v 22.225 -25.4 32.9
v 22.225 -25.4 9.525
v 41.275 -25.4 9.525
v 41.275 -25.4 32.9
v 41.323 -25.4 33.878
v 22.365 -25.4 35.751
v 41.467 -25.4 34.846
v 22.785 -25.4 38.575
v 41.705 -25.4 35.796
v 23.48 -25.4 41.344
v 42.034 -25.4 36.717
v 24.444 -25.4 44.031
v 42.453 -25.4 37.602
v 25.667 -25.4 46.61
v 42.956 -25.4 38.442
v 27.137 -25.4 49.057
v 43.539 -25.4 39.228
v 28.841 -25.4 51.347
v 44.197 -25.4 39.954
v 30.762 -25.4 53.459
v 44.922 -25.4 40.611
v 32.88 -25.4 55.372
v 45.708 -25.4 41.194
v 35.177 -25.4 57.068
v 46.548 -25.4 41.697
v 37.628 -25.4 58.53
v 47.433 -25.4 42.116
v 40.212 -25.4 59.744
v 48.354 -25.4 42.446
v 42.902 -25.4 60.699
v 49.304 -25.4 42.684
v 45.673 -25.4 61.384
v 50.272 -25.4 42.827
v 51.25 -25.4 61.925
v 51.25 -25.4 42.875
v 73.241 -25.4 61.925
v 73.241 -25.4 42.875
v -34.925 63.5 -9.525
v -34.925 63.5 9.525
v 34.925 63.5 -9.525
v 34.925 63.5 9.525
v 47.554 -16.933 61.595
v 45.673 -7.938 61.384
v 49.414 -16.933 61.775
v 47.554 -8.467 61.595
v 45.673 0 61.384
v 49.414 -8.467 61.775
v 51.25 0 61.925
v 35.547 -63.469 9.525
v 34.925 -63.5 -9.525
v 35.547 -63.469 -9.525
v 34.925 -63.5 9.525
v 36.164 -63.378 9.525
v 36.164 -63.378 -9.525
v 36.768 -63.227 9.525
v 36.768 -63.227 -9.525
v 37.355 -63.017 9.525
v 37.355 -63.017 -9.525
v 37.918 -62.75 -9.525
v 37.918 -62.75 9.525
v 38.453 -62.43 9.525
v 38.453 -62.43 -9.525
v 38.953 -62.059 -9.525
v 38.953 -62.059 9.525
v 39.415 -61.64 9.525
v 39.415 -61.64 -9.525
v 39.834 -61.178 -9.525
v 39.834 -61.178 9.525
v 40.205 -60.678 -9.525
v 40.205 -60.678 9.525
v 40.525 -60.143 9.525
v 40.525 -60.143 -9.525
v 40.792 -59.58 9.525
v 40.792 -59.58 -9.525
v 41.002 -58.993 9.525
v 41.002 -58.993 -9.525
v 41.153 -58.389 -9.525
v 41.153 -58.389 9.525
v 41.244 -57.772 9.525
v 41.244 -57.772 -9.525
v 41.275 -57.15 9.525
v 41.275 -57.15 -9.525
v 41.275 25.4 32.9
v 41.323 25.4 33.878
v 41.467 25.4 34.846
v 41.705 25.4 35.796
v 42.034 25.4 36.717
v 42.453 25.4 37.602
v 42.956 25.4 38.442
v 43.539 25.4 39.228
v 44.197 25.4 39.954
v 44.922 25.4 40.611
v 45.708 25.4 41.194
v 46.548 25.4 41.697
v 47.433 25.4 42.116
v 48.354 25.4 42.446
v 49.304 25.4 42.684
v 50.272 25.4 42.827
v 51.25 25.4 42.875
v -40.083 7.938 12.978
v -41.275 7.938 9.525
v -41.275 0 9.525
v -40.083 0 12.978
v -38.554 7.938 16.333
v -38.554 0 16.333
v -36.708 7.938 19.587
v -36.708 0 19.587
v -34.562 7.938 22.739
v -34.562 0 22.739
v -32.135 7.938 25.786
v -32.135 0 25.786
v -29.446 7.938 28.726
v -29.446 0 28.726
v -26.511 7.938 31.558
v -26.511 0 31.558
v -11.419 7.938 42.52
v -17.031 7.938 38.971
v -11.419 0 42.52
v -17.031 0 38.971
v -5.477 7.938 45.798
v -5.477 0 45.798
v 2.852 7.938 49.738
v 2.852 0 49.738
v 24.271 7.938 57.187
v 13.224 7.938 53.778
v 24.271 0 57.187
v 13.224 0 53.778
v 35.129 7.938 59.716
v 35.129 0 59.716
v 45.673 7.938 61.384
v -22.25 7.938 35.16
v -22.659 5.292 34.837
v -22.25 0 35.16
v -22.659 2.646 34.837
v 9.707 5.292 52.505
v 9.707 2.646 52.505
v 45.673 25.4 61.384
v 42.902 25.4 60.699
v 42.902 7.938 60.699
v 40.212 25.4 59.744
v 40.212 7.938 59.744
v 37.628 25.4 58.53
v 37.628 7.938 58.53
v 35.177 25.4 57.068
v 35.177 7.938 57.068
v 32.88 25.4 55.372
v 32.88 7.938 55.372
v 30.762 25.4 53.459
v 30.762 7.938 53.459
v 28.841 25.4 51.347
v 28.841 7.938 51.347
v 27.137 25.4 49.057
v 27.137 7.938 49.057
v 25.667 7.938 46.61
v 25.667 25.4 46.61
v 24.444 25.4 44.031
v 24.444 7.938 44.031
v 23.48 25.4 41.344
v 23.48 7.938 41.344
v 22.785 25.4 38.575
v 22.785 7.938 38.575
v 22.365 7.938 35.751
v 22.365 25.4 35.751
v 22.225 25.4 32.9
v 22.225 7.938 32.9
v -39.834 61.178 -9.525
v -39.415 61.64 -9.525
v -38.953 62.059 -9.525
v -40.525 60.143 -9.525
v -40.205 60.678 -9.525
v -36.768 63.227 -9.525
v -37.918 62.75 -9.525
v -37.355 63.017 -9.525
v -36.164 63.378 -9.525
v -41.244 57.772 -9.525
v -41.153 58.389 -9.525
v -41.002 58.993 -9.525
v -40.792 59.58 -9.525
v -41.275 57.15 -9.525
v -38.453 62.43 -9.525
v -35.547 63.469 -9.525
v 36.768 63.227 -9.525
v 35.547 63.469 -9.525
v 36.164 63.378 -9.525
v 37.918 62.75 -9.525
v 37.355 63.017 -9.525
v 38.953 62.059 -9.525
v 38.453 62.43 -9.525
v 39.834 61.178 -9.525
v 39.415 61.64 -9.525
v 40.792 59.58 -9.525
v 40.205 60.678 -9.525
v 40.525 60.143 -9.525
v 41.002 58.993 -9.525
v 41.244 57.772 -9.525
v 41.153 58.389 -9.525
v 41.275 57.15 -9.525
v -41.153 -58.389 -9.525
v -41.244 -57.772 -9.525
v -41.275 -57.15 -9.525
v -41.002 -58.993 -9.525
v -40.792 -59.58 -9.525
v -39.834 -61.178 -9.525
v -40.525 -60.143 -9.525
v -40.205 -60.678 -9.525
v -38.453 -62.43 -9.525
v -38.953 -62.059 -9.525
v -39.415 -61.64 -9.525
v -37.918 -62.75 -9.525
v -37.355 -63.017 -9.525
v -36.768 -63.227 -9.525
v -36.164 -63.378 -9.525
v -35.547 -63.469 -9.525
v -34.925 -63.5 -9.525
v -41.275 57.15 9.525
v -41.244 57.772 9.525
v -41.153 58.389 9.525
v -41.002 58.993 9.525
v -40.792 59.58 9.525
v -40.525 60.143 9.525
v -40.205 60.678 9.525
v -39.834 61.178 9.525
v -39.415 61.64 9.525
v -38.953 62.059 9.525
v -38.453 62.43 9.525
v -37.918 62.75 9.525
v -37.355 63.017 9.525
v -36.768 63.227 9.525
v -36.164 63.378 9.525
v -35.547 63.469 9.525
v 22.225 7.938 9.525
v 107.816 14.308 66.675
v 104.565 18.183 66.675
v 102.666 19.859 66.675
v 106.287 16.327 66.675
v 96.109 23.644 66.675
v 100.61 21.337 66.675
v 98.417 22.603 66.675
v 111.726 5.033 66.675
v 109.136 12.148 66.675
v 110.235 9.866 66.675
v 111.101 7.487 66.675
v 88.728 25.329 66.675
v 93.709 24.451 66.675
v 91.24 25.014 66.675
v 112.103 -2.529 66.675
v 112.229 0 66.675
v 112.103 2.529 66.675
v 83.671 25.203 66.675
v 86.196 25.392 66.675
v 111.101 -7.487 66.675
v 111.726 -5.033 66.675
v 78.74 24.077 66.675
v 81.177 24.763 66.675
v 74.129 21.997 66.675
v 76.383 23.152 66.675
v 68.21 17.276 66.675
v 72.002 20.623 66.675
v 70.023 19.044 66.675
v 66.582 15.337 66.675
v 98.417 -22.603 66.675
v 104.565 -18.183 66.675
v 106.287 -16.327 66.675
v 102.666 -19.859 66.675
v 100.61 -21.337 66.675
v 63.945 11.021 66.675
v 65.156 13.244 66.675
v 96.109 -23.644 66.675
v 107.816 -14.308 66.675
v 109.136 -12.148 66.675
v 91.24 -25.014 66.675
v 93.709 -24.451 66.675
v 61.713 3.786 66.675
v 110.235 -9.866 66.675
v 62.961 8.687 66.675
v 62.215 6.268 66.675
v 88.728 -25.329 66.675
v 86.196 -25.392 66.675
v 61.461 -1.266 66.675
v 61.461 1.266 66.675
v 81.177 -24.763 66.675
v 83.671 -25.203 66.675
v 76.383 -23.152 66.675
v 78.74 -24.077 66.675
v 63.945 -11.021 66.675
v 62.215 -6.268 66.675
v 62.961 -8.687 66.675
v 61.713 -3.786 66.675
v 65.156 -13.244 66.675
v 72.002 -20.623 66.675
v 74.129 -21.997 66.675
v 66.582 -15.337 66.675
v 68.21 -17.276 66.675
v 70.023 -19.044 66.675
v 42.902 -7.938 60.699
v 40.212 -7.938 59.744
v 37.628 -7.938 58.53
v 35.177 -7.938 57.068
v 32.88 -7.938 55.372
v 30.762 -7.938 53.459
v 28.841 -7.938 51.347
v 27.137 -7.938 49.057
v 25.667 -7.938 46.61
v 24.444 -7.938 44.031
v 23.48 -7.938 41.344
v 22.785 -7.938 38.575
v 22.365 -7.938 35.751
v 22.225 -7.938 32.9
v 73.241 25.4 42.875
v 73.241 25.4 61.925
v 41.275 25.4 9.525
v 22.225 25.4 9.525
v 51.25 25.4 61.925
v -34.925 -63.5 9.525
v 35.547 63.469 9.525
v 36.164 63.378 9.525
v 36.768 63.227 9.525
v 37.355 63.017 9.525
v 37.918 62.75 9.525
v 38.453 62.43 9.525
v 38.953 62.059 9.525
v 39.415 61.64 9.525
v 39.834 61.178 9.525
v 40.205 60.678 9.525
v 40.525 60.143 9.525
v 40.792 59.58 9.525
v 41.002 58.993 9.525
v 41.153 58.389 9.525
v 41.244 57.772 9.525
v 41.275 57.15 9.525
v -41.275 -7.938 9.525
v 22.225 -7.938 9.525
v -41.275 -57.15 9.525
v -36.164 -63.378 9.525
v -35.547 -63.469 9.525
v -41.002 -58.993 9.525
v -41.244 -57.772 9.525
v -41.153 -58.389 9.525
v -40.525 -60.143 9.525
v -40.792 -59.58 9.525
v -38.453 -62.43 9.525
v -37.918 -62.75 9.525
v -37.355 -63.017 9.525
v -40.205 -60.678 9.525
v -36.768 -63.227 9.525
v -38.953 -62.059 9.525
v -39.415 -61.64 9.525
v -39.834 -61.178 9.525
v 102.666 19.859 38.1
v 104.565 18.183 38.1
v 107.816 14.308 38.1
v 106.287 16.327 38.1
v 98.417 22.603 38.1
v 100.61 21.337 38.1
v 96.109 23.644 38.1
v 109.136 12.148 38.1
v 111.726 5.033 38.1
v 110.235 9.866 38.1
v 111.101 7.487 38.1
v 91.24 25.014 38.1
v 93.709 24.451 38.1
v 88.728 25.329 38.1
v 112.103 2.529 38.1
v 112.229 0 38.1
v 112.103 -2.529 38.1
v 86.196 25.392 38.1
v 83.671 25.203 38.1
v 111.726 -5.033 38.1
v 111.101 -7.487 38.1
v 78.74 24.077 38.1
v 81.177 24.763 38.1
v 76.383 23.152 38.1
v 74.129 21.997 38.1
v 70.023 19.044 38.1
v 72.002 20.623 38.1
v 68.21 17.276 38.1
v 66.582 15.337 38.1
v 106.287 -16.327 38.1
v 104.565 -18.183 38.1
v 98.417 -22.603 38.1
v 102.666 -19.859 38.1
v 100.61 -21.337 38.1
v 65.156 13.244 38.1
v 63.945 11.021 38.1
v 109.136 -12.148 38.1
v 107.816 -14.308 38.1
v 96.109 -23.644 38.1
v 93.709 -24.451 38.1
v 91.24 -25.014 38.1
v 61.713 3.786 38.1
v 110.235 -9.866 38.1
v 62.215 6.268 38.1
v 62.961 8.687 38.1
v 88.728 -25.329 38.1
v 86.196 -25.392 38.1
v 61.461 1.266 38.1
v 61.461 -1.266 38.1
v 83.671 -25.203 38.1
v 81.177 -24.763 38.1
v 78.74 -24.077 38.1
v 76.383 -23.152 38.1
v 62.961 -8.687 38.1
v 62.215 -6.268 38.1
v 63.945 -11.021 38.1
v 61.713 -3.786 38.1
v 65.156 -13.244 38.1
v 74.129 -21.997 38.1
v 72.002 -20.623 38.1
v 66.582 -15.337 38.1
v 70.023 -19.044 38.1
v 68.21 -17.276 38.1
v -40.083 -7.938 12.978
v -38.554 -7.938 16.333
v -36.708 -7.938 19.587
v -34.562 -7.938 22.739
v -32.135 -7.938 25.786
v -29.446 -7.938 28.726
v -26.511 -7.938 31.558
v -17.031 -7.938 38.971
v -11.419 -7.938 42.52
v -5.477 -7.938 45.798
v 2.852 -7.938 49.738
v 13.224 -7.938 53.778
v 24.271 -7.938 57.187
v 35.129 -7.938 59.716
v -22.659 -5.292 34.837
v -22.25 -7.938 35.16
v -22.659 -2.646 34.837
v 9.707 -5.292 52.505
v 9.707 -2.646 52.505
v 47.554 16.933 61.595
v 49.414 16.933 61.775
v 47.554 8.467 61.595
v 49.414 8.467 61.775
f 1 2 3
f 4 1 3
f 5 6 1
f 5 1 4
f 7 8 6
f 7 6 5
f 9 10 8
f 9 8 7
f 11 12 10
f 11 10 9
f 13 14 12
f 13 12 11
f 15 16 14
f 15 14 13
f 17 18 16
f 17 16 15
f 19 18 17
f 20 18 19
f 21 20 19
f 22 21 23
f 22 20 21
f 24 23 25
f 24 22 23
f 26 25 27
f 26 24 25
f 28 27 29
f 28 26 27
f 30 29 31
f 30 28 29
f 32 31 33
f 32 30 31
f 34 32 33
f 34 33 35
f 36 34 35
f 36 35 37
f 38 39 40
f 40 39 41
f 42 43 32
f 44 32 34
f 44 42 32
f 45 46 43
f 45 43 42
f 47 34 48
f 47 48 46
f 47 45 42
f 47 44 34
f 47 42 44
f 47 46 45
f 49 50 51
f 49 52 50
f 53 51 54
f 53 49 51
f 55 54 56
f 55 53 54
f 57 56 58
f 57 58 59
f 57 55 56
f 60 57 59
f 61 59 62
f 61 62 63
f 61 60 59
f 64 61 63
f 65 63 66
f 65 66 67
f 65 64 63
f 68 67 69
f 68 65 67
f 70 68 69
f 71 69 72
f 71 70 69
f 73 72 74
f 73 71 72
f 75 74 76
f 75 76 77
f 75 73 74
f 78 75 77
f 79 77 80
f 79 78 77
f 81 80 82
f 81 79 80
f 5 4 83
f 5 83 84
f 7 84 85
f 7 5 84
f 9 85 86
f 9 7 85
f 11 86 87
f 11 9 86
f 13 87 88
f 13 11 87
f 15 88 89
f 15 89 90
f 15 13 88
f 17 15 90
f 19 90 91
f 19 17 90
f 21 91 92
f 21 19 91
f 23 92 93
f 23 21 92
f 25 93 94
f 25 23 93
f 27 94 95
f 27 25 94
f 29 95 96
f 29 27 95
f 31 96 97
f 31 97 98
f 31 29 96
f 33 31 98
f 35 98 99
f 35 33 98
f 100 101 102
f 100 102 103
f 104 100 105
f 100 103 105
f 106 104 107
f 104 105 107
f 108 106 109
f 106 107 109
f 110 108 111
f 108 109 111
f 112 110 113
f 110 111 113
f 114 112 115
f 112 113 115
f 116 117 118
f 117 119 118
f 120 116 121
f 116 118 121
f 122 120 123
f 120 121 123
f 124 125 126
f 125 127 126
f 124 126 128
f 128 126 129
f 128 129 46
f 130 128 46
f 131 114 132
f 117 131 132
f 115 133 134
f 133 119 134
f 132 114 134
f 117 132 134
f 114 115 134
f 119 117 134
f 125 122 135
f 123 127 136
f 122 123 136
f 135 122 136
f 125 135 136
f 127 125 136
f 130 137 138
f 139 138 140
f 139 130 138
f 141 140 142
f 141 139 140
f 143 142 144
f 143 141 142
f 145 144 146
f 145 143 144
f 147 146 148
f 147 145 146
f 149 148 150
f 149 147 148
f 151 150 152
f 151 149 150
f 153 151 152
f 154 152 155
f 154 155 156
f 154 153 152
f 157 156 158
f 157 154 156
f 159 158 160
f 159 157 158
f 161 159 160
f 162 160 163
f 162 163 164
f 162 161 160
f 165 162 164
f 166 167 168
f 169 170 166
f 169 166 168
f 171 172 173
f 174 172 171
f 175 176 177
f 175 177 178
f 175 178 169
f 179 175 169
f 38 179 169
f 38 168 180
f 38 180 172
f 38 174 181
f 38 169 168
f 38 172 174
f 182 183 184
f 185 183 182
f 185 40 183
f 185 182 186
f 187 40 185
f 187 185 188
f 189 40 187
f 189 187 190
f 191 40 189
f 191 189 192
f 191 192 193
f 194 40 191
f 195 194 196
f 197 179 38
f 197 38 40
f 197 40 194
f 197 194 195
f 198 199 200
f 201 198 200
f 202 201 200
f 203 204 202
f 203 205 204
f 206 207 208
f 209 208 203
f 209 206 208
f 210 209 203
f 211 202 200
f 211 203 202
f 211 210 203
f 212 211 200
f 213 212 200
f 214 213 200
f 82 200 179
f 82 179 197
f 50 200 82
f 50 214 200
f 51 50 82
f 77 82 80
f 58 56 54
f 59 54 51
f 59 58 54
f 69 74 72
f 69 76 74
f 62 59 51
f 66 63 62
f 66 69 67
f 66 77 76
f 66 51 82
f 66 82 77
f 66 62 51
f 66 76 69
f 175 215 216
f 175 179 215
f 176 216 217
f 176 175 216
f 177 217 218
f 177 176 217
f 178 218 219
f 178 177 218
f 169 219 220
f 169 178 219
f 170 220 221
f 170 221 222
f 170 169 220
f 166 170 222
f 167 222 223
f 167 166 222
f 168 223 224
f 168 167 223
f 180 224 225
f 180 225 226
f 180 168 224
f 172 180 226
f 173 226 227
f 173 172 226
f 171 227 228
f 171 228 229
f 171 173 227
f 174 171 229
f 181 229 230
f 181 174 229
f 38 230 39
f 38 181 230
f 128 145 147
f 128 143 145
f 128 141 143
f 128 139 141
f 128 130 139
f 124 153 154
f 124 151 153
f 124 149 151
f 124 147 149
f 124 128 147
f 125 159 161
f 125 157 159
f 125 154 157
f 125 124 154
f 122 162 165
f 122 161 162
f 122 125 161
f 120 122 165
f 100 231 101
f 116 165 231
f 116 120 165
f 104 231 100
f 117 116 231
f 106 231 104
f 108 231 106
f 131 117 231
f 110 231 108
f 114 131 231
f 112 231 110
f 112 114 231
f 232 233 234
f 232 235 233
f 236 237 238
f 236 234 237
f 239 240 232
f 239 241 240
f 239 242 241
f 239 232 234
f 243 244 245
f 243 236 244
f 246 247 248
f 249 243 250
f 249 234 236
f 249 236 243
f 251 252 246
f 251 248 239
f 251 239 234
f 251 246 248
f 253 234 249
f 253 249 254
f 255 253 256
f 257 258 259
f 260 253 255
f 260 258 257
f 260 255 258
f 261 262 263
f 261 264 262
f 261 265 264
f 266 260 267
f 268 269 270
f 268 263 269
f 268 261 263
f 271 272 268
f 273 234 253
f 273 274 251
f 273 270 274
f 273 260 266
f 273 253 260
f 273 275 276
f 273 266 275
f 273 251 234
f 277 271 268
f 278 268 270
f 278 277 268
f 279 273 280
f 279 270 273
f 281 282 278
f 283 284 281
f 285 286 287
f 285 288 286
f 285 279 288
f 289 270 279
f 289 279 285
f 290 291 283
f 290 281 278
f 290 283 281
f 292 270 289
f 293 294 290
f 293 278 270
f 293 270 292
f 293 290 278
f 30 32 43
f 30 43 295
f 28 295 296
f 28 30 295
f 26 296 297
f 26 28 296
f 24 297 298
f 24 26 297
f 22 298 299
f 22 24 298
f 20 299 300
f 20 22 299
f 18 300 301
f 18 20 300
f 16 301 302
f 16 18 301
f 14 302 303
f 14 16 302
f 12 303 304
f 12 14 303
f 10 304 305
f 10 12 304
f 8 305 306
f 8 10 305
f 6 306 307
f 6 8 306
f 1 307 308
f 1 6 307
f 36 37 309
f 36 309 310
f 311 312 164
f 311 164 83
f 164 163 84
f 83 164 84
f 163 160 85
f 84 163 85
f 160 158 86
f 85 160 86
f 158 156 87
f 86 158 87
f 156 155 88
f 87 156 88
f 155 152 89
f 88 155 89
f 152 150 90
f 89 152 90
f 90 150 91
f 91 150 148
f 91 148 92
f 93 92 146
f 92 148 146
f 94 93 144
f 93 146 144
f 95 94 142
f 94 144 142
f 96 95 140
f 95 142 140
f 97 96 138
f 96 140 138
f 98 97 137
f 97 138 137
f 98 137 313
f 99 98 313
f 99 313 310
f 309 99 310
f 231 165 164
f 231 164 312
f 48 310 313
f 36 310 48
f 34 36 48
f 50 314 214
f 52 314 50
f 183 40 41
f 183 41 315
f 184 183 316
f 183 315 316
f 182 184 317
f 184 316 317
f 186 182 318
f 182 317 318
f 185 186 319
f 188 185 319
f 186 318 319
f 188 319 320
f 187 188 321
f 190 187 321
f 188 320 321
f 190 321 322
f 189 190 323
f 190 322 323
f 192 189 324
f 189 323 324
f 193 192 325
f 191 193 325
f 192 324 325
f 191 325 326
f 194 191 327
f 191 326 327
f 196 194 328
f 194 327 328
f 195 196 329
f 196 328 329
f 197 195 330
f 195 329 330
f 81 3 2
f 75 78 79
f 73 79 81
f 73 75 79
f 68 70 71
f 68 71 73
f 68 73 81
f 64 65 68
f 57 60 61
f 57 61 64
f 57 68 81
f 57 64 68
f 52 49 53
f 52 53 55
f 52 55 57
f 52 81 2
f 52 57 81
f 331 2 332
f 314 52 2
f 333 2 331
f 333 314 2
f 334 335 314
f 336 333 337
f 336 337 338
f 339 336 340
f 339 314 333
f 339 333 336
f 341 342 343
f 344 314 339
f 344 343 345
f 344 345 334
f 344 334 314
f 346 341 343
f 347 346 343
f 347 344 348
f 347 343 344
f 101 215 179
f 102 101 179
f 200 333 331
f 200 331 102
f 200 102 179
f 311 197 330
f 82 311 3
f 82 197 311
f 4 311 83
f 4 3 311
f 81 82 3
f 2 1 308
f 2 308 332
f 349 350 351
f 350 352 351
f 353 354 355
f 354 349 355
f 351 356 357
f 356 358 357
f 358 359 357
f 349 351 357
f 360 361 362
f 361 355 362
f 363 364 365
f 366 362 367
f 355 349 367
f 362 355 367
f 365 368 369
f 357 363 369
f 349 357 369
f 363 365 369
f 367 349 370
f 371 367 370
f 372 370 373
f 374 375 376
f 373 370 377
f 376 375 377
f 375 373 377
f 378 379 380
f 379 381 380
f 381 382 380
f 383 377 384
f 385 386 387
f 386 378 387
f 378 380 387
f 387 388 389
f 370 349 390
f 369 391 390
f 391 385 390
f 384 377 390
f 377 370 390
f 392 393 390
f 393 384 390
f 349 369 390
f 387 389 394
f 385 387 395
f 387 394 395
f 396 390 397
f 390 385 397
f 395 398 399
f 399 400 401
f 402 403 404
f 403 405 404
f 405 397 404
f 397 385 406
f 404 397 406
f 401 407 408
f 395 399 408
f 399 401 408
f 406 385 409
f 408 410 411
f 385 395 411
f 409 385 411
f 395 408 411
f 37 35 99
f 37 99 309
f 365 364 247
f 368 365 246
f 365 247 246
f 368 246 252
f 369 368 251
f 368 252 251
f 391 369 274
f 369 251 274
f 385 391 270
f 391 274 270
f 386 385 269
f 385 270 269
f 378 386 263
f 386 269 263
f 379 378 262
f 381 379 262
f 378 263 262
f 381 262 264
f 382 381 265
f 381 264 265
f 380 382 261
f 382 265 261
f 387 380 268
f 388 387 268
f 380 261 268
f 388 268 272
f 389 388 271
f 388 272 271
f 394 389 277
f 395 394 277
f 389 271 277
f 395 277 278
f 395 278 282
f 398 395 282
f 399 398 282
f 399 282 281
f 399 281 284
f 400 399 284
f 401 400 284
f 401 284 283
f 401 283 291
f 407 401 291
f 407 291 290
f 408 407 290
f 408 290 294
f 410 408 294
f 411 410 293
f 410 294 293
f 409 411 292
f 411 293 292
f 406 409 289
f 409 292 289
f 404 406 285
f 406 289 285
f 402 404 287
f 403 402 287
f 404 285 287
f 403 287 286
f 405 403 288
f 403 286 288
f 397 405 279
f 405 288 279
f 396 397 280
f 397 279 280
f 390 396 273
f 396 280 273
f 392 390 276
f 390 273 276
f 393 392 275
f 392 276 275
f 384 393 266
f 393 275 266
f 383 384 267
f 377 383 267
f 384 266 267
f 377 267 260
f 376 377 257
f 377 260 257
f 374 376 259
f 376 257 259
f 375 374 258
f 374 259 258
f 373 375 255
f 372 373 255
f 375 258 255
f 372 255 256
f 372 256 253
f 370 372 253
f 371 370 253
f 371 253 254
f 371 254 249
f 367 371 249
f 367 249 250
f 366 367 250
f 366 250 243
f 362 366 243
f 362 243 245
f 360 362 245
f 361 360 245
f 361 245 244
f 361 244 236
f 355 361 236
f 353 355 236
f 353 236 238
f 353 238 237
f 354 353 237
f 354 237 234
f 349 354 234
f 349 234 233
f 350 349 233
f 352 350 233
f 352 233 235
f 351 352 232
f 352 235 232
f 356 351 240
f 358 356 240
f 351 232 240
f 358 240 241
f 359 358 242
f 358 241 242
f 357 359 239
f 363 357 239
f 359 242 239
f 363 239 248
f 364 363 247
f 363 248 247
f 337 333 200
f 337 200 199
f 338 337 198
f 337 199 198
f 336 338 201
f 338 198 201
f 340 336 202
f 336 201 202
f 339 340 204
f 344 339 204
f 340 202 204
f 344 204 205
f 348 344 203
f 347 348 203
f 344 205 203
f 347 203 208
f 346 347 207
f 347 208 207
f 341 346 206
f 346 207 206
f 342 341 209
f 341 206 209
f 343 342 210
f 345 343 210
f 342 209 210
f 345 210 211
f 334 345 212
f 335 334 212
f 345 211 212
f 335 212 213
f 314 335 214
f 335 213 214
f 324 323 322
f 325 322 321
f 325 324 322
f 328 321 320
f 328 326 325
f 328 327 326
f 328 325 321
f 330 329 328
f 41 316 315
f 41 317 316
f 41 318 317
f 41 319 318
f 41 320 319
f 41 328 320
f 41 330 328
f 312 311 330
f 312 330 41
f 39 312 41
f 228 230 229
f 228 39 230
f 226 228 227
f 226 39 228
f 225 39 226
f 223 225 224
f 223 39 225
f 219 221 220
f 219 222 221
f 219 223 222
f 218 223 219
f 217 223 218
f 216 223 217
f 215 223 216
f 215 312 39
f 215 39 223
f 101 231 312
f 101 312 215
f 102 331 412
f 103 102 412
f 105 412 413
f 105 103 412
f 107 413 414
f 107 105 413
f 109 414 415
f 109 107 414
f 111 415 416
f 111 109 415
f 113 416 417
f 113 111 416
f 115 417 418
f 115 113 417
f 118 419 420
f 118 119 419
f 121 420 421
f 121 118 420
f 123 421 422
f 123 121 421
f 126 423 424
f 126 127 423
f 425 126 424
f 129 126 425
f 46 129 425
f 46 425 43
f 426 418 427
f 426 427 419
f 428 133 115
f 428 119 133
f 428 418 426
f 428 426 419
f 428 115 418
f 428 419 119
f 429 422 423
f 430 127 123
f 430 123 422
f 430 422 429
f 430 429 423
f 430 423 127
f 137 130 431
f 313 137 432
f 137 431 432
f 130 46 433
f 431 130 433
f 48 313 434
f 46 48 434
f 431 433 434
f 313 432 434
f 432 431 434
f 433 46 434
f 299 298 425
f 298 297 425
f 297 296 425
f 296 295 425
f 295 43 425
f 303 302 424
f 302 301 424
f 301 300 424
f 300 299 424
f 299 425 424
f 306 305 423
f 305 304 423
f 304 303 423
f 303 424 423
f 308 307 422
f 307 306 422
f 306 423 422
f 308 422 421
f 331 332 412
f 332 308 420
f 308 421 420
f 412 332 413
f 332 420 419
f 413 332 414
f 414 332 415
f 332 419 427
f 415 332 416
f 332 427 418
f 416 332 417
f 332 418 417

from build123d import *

# Parameters (mm, degrees)
F1_DEPTH = 63.5
F0_W     = 11.81127
F0_H     = 19.05
F2_DEPTH = 25.4
F3_DEPTH = 7.9375
F0_W_2   = 25.4
F0_H_2   = 28.575
F5_R     = 6.35


with BuildPart() as f1:
    # F0 (on Front) → F1 (new body, symmetric)
    with BuildSketch(Plane.XZ):
        Polygon((-41.275, 9.525), (-41.275, -9.525), (41.275, -9.525), (41.275, 9.525), (22.225, 9.525), align=None)
    extrude(amount=F1_DEPTH, both=True)

    # F0 (on Front) → F2 (join, symmetric)
    with BuildSketch(Plane.XZ):
        with BuildLine():
            Line((22.225, 9.525), (41.275, 9.525))
            Line((41.275, 9.525), (41.275, 32.900145))
            ThreePointArc((41.275, 32.900145), (44.196626, 39.953574), (51.250055, 42.8752))
            Line((51.250055, 42.8752), (61.429398, 42.8752))
            Line((61.429398, 42.8752), (61.429398, 61.9252))
            Line((61.429398, 61.9252), (51.250055, 61.9252))
            add(Edge.make_bspline(
                [(45.673429, 61.38444), (47.564535, 61.610059), (49.425943, 61.790599), (51.250055, 61.9252)],
                knots=[100.789596, 100.789596, 100.789596, 100.789596, 106.332811, 106.332811, 106.332811, 106.332811], degree=3))
            ThreePointArc((45.673429, 61.38444), (28.841176, 51.347258), (22.225, 32.900145))
            Line((22.225, 32.900145), (22.225, 9.525))
        make_face()
        with Locations((67.335033, 52.4002)):
            Rectangle(F0_W, F0_H)
    extrude(amount=F2_DEPTH, both=True)

    # F0 (on Front) → F3 (join, symmetric)
    with BuildSketch(Plane.XZ):
        with BuildLine():
            add(Edge.make_bspline(
                [(-41.275, 9.525), (-32.915342, 38.276129), (11.288356, 57.28211), (45.673429, 61.38444)],
                knots=[0, 0, 0, 0, 100.789596, 100.789596, 100.789596, 100.789596], degree=3))
            Line((-41.275, 9.525), (22.225, 9.525))
            Line((22.225, 9.525), (22.225, 32.900145))
            ThreePointArc((22.225, 32.900145), (28.841176, 51.347258), (45.673429, 61.38444))
        make_face()
    extrude(amount=F3_DEPTH, both=True)

    # F5
    f5_edges = [f1.edges().sort_by_distance(p)[0] for p in [
        (-41.275, -63.5, 0),
        (-41.275, 63.5, 0),
        (41.275, -63.5, 0),
        (41.275, 63.5, 0),
    ]]
    fillet(f5_edges, radius=F5_R)


with BuildPart() as f4:
    # F0 (on Front) → F4 (revolve)
    with BuildSketch(Plane.XZ):
        with Locations((99.529398, 52.3875)):
            Rectangle(F0_W_2, F0_H_2)
    revolve(axis=Axis((86.829398, 0, 52.3875), (0, 0, -1)))


solid = Compound([f1.part, f4.part])
